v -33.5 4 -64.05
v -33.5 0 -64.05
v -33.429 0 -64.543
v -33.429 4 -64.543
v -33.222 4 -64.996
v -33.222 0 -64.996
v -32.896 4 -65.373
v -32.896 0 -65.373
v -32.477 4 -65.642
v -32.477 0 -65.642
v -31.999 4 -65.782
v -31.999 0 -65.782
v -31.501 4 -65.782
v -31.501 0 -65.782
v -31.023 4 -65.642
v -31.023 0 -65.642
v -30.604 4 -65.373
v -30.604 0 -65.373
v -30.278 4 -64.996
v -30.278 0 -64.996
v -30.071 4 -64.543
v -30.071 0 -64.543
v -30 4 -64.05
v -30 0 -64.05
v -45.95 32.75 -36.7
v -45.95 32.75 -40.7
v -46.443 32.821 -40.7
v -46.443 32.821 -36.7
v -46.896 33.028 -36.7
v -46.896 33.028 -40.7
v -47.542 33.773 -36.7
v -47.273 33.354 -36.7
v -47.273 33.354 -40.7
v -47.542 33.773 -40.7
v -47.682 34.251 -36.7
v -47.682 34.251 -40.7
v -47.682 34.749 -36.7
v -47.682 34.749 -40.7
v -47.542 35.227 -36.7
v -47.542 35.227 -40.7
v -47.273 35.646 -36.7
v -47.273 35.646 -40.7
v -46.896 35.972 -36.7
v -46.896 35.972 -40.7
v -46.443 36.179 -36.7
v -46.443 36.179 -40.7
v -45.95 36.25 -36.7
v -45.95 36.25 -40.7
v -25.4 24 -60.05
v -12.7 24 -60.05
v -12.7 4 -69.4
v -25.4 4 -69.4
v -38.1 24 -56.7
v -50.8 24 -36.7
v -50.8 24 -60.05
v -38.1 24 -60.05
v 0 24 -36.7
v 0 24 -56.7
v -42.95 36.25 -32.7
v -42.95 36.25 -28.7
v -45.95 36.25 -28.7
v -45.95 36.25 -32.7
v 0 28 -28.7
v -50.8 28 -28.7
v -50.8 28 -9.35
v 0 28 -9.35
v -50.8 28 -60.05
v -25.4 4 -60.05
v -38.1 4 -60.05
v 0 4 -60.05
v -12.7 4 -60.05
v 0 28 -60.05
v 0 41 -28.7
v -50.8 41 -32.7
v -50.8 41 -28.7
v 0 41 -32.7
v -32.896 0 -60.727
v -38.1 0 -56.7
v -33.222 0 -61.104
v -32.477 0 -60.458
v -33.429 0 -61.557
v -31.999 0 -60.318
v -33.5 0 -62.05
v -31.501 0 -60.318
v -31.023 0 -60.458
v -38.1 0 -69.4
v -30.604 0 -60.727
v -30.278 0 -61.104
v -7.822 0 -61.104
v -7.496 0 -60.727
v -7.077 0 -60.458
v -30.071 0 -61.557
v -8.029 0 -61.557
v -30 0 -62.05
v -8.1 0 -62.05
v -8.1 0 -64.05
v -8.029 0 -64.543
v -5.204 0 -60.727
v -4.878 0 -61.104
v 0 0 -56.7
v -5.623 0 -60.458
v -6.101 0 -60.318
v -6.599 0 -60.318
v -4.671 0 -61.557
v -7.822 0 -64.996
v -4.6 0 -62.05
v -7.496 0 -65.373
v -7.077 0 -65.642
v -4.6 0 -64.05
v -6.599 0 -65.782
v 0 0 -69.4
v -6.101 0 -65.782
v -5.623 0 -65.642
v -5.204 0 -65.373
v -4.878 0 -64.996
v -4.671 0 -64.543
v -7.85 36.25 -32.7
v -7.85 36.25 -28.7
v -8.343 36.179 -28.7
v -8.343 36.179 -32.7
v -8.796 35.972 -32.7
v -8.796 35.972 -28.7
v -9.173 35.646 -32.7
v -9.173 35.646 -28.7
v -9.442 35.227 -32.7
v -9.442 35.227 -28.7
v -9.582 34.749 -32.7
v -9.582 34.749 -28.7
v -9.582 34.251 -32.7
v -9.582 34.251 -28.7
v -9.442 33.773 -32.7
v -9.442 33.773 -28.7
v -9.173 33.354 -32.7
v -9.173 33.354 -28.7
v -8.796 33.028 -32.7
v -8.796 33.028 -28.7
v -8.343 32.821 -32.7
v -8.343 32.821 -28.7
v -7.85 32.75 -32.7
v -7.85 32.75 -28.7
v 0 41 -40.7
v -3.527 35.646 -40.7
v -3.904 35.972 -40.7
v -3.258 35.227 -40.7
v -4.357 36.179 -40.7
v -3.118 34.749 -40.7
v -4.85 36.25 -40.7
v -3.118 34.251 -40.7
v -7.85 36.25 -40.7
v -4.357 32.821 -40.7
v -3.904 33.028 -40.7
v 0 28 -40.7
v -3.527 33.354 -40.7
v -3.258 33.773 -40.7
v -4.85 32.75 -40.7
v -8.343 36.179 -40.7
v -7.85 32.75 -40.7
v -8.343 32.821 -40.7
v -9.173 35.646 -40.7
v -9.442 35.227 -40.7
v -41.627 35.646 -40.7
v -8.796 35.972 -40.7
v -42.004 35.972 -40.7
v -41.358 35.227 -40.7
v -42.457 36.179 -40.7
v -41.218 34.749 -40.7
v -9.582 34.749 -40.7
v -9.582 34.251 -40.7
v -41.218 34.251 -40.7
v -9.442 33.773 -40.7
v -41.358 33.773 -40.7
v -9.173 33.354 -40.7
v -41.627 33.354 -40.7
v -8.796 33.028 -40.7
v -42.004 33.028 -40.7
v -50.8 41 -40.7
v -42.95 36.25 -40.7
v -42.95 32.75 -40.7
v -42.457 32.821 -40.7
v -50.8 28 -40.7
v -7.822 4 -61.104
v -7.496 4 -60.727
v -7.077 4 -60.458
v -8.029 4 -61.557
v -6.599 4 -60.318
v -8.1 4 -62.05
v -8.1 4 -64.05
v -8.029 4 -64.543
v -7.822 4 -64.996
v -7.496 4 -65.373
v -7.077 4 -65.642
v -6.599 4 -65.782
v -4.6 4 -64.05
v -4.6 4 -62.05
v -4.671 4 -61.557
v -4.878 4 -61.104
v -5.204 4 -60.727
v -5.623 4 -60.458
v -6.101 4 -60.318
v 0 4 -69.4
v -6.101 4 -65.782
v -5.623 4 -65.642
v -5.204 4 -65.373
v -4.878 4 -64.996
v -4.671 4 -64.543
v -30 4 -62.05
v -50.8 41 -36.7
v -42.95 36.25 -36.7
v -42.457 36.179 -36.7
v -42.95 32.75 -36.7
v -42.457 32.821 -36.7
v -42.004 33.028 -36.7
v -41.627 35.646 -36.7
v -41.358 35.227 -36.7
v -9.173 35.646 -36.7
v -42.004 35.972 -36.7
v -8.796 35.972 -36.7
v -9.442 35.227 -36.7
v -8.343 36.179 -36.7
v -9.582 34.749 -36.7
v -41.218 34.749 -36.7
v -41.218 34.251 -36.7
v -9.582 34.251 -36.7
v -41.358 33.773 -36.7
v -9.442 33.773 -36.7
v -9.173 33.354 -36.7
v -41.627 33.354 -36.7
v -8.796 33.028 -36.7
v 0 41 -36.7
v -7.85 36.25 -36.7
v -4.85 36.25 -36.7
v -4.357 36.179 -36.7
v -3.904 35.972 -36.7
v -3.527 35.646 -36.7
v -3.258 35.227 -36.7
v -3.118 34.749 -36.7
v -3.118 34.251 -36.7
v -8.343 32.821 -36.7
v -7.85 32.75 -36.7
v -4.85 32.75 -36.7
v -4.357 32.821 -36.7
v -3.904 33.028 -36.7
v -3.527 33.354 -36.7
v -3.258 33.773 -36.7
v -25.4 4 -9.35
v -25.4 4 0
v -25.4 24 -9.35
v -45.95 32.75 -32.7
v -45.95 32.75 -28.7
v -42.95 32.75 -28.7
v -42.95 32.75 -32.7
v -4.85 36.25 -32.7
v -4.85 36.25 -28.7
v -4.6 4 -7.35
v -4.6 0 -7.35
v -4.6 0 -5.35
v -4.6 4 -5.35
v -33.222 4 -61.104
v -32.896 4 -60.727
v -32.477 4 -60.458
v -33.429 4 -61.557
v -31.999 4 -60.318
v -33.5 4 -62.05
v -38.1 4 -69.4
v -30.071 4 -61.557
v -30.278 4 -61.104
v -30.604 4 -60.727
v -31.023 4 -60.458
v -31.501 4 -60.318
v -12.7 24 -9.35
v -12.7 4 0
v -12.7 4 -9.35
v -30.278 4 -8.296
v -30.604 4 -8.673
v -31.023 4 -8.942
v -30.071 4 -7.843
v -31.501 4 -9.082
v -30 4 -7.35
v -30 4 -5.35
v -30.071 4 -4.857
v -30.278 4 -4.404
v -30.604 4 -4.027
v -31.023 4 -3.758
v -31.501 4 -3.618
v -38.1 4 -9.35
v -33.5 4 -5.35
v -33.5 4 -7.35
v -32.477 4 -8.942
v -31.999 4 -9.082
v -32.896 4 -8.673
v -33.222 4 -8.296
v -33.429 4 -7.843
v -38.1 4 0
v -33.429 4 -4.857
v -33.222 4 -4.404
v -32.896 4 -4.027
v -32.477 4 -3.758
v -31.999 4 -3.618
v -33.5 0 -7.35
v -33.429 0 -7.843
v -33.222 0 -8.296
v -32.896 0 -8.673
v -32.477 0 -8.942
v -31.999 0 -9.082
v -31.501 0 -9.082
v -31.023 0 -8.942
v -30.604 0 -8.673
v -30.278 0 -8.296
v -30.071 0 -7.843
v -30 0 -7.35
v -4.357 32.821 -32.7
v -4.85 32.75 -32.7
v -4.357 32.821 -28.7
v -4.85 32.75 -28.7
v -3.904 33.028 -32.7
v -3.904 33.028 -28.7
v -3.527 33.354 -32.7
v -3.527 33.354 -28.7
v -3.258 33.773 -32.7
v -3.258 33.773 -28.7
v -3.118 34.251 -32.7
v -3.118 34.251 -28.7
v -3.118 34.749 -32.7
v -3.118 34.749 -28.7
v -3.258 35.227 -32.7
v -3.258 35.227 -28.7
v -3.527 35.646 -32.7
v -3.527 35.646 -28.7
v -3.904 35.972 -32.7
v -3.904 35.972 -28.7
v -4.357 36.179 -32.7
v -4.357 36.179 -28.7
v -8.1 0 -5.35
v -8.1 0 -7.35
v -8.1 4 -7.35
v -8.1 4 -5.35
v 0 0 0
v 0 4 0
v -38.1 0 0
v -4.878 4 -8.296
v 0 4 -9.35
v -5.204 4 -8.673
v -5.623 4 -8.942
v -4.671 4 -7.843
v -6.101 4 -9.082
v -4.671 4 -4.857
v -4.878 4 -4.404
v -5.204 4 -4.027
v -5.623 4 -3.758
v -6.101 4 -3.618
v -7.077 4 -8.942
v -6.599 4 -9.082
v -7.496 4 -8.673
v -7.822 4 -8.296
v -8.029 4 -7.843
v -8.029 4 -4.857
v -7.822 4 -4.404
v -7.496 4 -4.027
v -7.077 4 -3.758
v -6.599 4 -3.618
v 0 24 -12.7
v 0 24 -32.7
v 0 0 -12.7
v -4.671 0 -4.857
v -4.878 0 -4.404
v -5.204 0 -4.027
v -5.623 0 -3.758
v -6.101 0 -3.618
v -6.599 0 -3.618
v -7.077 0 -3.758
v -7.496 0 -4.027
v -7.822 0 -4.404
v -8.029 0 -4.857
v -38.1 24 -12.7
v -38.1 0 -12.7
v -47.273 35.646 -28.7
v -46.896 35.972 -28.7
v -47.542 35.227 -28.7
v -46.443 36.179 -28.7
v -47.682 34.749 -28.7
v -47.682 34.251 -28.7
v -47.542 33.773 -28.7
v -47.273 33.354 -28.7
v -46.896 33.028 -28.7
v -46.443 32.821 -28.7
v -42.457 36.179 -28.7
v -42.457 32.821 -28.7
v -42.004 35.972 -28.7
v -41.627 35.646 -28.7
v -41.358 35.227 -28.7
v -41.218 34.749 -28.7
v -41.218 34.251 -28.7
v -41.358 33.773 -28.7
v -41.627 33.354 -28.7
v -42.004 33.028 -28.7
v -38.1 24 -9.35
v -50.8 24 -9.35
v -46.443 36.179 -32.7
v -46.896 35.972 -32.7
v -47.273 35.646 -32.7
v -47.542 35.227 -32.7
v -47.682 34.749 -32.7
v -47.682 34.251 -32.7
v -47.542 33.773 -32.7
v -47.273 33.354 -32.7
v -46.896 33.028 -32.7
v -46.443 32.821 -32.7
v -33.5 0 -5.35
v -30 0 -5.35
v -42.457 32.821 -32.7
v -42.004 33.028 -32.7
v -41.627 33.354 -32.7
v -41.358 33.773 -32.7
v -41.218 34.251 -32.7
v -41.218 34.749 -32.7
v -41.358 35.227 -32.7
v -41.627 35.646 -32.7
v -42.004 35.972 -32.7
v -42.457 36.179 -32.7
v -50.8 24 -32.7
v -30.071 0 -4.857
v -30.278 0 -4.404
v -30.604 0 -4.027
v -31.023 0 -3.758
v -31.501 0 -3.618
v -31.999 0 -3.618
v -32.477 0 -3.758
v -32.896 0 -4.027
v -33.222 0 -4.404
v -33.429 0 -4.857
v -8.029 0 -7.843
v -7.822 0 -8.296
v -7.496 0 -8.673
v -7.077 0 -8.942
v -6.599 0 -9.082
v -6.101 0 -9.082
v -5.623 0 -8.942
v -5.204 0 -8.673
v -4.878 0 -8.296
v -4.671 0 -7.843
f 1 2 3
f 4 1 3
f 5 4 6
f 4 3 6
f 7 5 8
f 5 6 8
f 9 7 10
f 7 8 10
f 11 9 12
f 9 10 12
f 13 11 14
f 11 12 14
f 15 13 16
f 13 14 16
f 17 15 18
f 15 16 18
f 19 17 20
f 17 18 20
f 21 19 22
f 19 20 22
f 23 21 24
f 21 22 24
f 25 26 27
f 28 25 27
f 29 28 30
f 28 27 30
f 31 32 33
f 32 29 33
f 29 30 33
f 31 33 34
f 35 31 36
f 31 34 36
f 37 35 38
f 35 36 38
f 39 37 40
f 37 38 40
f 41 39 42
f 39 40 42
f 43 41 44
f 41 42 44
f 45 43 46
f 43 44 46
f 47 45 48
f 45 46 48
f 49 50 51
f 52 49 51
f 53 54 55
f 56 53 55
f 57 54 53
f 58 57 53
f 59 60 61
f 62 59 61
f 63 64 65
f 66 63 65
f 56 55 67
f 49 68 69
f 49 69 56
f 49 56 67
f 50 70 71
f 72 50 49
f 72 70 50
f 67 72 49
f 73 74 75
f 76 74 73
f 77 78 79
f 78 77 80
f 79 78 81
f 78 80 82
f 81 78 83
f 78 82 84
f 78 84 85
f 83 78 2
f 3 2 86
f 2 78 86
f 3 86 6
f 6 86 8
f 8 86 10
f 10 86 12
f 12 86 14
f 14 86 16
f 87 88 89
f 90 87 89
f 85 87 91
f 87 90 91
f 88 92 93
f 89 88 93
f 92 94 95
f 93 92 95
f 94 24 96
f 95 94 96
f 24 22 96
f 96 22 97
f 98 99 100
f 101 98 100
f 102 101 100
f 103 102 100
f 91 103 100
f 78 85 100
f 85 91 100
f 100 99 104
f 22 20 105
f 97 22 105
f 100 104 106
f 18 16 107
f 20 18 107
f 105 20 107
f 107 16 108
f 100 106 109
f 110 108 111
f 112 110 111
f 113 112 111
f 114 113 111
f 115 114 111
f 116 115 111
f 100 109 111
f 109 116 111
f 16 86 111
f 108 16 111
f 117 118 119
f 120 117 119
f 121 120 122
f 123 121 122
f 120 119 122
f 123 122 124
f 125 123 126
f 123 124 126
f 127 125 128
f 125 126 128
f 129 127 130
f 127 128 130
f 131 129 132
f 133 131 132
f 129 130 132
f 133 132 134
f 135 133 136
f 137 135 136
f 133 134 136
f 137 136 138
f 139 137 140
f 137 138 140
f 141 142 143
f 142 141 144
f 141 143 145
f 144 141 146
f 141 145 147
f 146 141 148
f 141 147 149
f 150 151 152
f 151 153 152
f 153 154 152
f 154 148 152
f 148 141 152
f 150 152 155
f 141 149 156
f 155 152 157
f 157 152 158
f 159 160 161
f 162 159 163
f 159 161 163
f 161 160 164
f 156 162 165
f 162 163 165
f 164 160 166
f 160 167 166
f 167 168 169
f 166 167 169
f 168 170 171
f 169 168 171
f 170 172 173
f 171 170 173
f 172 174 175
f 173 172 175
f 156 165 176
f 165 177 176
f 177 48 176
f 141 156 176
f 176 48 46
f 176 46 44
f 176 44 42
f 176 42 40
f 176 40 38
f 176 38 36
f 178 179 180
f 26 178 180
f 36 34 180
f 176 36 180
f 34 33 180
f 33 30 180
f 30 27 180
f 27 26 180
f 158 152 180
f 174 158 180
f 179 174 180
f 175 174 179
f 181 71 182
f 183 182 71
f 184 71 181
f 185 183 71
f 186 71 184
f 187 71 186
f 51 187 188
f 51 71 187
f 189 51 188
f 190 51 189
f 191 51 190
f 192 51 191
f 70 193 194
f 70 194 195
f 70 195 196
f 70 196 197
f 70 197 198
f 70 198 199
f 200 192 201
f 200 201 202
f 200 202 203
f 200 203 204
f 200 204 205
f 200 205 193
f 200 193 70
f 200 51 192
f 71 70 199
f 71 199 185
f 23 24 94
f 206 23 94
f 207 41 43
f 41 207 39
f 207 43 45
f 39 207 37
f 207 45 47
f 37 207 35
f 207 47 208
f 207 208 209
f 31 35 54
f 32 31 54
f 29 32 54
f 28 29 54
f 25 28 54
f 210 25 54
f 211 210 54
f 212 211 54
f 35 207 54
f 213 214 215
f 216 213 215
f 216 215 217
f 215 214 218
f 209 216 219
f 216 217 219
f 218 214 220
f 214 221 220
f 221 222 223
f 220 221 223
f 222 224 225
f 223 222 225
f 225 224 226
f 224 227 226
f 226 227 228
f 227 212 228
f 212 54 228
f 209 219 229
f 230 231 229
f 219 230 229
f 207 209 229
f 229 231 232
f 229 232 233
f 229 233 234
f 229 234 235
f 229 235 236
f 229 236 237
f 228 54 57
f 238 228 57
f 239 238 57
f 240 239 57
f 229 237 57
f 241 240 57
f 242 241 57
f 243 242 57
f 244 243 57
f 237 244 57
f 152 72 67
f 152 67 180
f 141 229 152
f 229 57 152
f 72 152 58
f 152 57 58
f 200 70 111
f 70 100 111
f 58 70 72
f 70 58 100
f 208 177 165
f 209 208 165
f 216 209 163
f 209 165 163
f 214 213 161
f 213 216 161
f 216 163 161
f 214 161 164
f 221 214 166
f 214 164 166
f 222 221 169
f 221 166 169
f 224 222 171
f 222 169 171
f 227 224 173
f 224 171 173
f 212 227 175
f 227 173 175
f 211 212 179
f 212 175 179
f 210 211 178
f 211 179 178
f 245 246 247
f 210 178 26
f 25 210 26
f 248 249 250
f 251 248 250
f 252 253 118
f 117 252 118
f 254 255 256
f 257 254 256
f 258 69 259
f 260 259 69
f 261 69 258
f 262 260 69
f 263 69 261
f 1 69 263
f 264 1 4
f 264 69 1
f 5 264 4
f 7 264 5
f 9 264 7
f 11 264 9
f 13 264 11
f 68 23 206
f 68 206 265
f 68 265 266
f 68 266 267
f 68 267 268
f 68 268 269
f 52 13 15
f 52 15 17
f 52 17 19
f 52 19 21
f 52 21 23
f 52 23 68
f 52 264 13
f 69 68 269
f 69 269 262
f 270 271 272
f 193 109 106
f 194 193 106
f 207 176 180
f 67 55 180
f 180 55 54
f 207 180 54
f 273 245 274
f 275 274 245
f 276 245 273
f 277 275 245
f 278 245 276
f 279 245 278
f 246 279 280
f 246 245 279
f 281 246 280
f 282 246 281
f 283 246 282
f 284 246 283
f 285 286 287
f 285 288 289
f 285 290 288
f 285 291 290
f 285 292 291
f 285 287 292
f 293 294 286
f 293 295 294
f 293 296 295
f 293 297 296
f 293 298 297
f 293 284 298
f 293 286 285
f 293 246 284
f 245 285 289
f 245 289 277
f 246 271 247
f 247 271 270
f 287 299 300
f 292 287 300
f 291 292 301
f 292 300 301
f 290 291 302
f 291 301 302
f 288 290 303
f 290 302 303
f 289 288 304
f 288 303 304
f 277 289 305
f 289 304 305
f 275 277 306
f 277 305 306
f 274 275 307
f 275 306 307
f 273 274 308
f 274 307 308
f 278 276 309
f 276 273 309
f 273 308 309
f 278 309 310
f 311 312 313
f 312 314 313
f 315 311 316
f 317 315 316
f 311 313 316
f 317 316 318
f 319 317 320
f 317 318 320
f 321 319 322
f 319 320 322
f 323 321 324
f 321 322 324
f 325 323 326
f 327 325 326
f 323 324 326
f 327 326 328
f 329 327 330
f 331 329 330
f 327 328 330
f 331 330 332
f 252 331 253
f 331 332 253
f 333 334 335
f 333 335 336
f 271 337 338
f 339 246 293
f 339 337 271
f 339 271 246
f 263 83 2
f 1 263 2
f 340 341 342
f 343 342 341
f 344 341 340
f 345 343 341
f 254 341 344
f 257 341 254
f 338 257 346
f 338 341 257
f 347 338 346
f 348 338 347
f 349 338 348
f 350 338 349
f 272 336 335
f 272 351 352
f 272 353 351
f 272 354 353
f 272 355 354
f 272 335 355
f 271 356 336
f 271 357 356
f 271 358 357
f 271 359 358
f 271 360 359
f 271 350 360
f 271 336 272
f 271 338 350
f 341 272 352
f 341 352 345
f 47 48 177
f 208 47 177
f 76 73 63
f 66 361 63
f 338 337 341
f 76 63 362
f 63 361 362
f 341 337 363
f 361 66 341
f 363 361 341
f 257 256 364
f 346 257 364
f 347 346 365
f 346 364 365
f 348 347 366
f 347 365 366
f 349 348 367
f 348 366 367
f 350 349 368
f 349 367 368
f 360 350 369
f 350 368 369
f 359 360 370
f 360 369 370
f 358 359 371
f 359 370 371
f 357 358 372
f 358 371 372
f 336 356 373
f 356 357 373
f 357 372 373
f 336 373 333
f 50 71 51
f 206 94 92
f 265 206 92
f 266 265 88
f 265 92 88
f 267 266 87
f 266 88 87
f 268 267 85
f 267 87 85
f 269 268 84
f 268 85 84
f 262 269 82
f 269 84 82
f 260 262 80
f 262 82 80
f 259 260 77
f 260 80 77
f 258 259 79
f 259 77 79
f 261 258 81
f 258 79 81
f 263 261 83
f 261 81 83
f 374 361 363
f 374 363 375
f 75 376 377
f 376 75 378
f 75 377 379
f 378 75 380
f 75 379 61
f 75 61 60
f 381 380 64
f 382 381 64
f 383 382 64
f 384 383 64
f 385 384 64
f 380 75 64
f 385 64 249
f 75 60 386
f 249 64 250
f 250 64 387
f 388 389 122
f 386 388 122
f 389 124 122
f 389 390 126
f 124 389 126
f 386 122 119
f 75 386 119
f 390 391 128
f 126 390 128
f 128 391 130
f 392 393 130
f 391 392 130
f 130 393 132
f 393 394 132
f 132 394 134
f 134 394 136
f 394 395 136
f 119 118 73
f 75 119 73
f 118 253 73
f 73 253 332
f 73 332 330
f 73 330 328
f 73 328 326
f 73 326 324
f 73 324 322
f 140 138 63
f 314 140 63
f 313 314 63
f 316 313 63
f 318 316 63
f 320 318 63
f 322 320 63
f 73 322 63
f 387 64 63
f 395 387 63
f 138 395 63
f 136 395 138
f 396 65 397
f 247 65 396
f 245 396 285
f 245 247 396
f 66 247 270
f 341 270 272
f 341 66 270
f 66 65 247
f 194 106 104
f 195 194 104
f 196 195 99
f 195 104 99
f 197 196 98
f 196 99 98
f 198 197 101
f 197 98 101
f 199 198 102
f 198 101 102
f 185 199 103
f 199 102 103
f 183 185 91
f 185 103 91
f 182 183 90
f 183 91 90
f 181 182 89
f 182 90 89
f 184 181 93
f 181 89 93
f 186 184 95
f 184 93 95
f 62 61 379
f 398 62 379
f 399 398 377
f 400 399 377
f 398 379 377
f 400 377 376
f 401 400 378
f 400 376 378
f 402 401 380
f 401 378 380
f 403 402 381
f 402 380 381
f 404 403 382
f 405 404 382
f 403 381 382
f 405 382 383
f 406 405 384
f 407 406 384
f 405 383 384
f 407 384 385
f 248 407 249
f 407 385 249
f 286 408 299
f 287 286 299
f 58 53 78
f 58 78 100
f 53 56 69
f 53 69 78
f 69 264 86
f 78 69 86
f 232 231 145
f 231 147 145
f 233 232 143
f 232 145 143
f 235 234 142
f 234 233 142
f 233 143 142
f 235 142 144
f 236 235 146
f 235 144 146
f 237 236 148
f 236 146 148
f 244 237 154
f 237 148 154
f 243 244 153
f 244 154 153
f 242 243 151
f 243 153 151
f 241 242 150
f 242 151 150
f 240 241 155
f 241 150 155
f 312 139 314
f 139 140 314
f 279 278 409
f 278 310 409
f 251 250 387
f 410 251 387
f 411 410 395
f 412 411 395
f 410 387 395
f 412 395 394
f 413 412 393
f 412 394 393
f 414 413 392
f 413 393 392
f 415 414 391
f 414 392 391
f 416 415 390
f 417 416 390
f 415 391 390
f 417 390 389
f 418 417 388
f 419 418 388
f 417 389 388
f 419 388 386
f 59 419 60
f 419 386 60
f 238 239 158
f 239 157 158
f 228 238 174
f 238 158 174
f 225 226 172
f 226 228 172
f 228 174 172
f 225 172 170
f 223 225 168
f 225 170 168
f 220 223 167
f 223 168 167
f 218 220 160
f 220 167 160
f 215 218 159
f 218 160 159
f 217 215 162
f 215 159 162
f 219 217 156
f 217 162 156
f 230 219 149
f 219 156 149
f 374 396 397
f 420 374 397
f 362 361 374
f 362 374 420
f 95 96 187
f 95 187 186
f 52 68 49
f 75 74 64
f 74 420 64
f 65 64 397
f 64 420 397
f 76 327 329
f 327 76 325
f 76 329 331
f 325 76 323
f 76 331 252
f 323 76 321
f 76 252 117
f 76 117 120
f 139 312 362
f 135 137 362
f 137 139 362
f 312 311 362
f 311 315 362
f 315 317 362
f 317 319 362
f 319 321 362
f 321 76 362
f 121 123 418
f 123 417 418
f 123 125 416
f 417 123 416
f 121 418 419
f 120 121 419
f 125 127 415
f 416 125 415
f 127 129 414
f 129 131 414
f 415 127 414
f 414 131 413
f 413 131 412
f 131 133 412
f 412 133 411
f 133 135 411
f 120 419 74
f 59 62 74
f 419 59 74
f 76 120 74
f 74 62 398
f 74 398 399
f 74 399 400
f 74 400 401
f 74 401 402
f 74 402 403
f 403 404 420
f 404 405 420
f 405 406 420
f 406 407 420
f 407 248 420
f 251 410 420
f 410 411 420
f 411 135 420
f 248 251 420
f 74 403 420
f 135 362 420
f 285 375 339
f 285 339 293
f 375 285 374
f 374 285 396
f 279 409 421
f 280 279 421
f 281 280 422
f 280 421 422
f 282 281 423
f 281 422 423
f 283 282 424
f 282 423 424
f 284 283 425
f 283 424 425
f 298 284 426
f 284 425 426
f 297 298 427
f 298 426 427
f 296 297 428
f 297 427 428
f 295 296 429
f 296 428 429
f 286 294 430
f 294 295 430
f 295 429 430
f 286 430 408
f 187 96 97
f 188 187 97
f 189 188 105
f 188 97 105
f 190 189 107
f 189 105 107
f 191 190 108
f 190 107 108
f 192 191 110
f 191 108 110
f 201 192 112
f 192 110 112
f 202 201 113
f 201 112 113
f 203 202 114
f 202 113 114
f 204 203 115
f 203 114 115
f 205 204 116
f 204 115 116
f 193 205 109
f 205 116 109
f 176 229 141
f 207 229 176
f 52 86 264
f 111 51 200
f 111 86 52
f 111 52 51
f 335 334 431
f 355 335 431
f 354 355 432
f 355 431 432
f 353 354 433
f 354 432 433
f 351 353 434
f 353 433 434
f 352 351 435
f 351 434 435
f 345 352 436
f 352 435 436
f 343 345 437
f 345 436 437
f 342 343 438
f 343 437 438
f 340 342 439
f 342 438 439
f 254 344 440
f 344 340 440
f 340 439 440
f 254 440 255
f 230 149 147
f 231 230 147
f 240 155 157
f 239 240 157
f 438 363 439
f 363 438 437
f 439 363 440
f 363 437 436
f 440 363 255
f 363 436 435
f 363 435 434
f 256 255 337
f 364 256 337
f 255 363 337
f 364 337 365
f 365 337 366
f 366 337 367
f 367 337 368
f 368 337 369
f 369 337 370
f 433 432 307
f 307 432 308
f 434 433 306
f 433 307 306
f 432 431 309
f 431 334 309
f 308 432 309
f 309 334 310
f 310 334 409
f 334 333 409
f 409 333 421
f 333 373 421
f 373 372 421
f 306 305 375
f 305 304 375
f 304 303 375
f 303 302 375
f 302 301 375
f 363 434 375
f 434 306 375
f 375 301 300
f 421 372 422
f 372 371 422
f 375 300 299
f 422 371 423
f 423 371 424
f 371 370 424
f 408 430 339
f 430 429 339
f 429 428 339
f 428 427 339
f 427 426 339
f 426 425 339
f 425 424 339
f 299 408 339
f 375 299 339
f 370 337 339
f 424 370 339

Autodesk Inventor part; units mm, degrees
ref_plane "YZ Plane" through (0, 0, 0) normal (1, 0, 0) x (0, 1, 0)
ref_plane "XZ Plane" through (0, 0, 0) normal (0, 1, 0) x (-1, 0, 0)
ref_plane "XY Plane" through (0, 0, 0) normal (0, 0, 1) x (1, 0, 0)
sketch "Sketch1" plane through (0, 0, 0) normal (0, 1, 0) x (-1, 0, 0)
  line L0 (0, 0) -> (38.1, 0)
  line L1 (38.1, 0) -> (38.1, -12.7)
  line L2 (38.1, -12.7) -> (0, -12.7)
  line L3 (0, -12.7) -> (0, 0)
  line L4 (38.1, 0) -> (0, -12.7) construction
  line L5 (0, 0) -> (38.1, -12.7) construction
  line L6 (0, -6.35) -> (38.1, -6.35) construction
  line L7 (19.05, -6.35) -> (31.75, -6.35) construction
  line L8 (19.05, -6.35) -> (6.35, -6.35)
  line L9 (6.35, -5.35) -> (31.75, -5.35)
  line L10 (31.75, -5.35) -> (31.75, -7.35)
  line L11 (31.75, -7.35) -> (6.35, -7.35)
  line L12 (6.35, -7.35) -> (6.35, -5.35)
  line L13 (6.35, -5.35) -> (31.75, -7.35) construction
  line L14 (31.75, -5.35) -> (6.35, -7.35) construction
  circle A0 centre (31.75, -7.35) radius 1.75
  circle A1 centre (31.75, -5.35) radius 1.75
  line L15 (33.5, -5.35) -> (33.5, -7.35)
  line L16 (30, -7.35) -> (30, -5.35)
  circle A2 centre (6.35, -7.35) radius 1.75
  circle A3 centre (6.35, -5.35) radius 1.75
  line L17 (4.6, -7.35) -> (4.6, -5.35)
  line L18 (8.1, -7.35) -> (8.1, -5.35)
  dimension "d0" = 38.1
  dimension "d1" = 12.7
  dimension "d2" = 12.7
  dimension "d3" = 12.7
  dimension "d12" = 25.4
  dimension "d13" = 2
  dimension "d14" = 3.5
  dimension "d15" = 3.5
  dimension "d16" = 3.5
  dimension "d17" = 3.5
extrude "Extrusion1" add sketch "Sketch1" along normal blind 4 contours L0 L1 L2 L3 | L18 L9 L16 L11
sketch "Sketch2" plane through (0, 0, 0) normal (1, 0, 0) x (0, 0, -1)
  line L0 (0, 0) -> (12.7, 0) projected
  line L1 (12.7, 0) -> (12.7, 4) projected
  line L2 (0, 4) -> (12.7, 4) projected
  line L3 (0, 0) -> (0, 4) projected
  line L4 (12.7, 4) -> (9.35, 4)
  line L5 (9.35, 4) -> (9.35, 24)
  line L6 (9.35, 24) -> (12.7, 24)
  line L7 (12.7, 24) -> (12.7, 4)
  dimension "d8" = 24
  dimension "d9" = 3.35
extrude "Extrusion2" add sketch "Sketch2" against normal up to surface (38.1 mm away) contours L2 L5 L6 L7
ref_plane "Work Plane1" through (-12.7, 0, 0) normal (1, 0, 0) x (0, 0, -1)
sketch "Sketch3" plane through (-12.7, 0, 0) normal (1, 0, 0) x (0, 0, -1)
  line L0 (0, 0) -> (12.7, 0) projected
  line L1 (12.7, 0) -> (12.7, 24) projected
  line L2 (12.7, 24) -> (9.35, 24) projected
  line L3 (9.35, 24) -> (9.35, 4) projected
  line L4 (0, 4) -> (9.35, 4) projected
  line L5 (0, 0) -> (0, 4) projected
  line L6 (0, 4) -> (9.35, 24)
extrude "Extrusion3" add sketch "Sketch3" against normal blind 12.7 contours L6 L3 L4
sketch "Sketch4" plane through (0, 0, -12.7) normal (0, 0, -1) x (-1, 0, 0)
  line L0 (0, 0) -> (38.1, 0) projected
  line L1 (38.1, 0) -> (38.1, 24) projected
  line L2 (0, 24) -> (38.1, 24) projected
  line L3 (0, 0) -> (0, 24) projected
  line L4 (0, 24) -> (12.7, 24) projected
  line L5 (0, 24) -> (38.1, 24)
  line L6 (38.1, 24) -> (38.1, 28)
  line L7 (38.1, 28) -> (0, 28)
  line L8 (0, 28) -> (0, 24)
  point P0 (0, 0)
  dimension "d21" = 4
extrude "Extrusion4" add sketch "Sketch4" against normal up to surface (3.35 mm away) contours L8 L7 L6 L2
extrude "Extrusion5" add sketch "Sketch4" along normal blind 20 contours L8 L7 L6 L2
sketch "Sketch5" plane through (-38.1, 0, -12.7) normal (-1, 0, 0) x (0, 0, 1)
  line L0 (0, 0) -> (12.7, 0) projected
  line L1 (12.7, 0) -> (12.7, 4) projected
  line L2 (3.35, 4) -> (12.7, 4) projected
  line L3 (3.35, 28) -> (3.35, 4) projected
  line L4 (-20, 28) -> (3.35, 28) projected
  line L5 (-20, 24) -> (-20, 28) projected
  line L6 (0, 24) -> (-20, 24) projected
  line L7 (0, 0) -> (0, 24) projected
  line L8 (-20, 24) -> (-20, 28) projected
  line L9 (3.35, 28) -> (3.35, 4) projected
  line L10 (-20, 24) -> (3.35, 24)
  line L11 (3.35, 24) -> (3.35, 28)
  line L12 (3.35, 28) -> (-20, 28)
  line L13 (-20, 28) -> (-20, 24)
  point P0 (12.7, 0)
extrude "Extrusion6" add sketch "Sketch5" along normal blind 12.7 contours L6 L5 L4 L3 L10
sketch "Sketch6" plane through (0, 28, -9.35) normal (0, 1, 0) x (1, 0, 0)
  line L0 (0, 0) -> (0, 23.35) projected
  line L1 (0, 23.35) -> (-50.8, 23.35)
  line L2 (-50.8, 23.35) -> (-50.8, 19.35)
  line L3 (-50.8, 19.35) -> (0, 19.35)
  line L4 (0, 19.35) -> (0, 23.35)
  point P0 (0, -9.35)
  point P1 (0, 19.35)
  dimension "d28" = 4
extrude "Extrusion7" add sketch "Sketch6" along normal blind 13
sketch "Sketch7" plane through (-50.8, 28, -28.7) normal (0, 0, 1) x (1, 0, 0)
  line L0 (50.8, 0) -> (0, 0) projected
  line L1 (50.8, 0) -> (50.8, 13) projected
  line L2 (0, 13) -> (50.8, 13) projected
  line L3 (0, 0) -> (0, 13) projected
  line L4 (0, -4) -> (0, 13) projected
  line L5 (0, 13) -> (6.35, 13)
  line L6 (6.35, 13) -> (6.35, 0) construction
  line L7 (6.35, 0) -> (0, 0)
  line L8 (0, 0) -> (0, 13)
  line L9 (50.8, 0) -> (0, 0) projected
  line L10 (50.8, -4) -> (50.8, 13) projected
  line L11 (50.8, 13) -> (44.45, 13)
  line L12 (44.45, 13) -> (44.45, 0) construction
  line L13 (44.45, 0) -> (50.8, 0)
  line L14 (50.8, 0) -> (50.8, 13)
  line L15 (6.35, 6.5) -> (44.45, 6.5) construction
  line L16 (42.95, 7.5) -> (45.95, 7.5) construction
  line L17 (45.95, 7.5) -> (45.95, 5.5) construction
  line L18 (45.95, 5.5) -> (42.95, 5.5) construction
  line L19 (42.95, 5.5) -> (42.95, 7.5) construction
  line L20 (42.95, 7.5) -> (45.95, 5.5) construction
  line L21 (45.95, 7.5) -> (42.95, 5.5) construction
  line L22 (4.85, 5.5) -> (7.85, 5.5) construction
  line L23 (7.85, 5.5) -> (7.85, 7.5) construction
  line L24 (7.85, 7.5) -> (4.85, 7.5) construction
  line L25 (4.85, 7.5) -> (4.85, 5.5) construction
  line L26 (4.85, 5.5) -> (7.85, 7.5) construction
  line L27 (7.85, 5.5) -> (4.85, 7.5) construction
  line L28 (4.85, 6.5) -> (7.85, 6.5) construction
  line L29 (4.85, 4.75) -> (7.85, 4.75)
  line L30 (7.85, 8.25) -> (4.85, 8.25)
  arc A0 (4.85, 8.25) -> (4.85, 4.75) centre (4.85, 6.5) ccw
  arc A1 (7.85, 4.75) -> (7.85, 8.25) centre (7.85, 6.5) ccw
  line L31 (42.95, 6.5) -> (45.95, 6.5) construction
  line L32 (42.95, 4.75) -> (45.95, 4.75)
  line L33 (45.95, 8.25) -> (42.95, 8.25)
  arc A2 (42.95, 8.25) -> (42.95, 4.75) centre (42.95, 6.5) ccw
  arc A3 (45.95, 4.75) -> (45.95, 8.25) centre (45.95, 6.5) ccw
  point P0 (50.8, -28)
  dimension "d31" = 6.35
  dimension "d32" = 6.35
  dimension "d33" = 3
  dimension "d34" = 2
  dimension "d35" = 3
  dimension "d36" = 2
  dimension "d37" = 3.5
  dimension "d38" = 3.5
extrude "Extrusion8" cut sketch "Sketch7" against normal up to surface (4 mm away) contours A0 L30 A1 L29 | A2 L33 A3 L32
ref_plane "Work Plane2" through (0, 0, -34.7) normal (0, 0, -1) x (-1, 0, 0)
mirror "Mirror1" about plane through (0, 0, -34.7) normal (0, 0, -1)
properties part number "IRMount_3DPrint"
